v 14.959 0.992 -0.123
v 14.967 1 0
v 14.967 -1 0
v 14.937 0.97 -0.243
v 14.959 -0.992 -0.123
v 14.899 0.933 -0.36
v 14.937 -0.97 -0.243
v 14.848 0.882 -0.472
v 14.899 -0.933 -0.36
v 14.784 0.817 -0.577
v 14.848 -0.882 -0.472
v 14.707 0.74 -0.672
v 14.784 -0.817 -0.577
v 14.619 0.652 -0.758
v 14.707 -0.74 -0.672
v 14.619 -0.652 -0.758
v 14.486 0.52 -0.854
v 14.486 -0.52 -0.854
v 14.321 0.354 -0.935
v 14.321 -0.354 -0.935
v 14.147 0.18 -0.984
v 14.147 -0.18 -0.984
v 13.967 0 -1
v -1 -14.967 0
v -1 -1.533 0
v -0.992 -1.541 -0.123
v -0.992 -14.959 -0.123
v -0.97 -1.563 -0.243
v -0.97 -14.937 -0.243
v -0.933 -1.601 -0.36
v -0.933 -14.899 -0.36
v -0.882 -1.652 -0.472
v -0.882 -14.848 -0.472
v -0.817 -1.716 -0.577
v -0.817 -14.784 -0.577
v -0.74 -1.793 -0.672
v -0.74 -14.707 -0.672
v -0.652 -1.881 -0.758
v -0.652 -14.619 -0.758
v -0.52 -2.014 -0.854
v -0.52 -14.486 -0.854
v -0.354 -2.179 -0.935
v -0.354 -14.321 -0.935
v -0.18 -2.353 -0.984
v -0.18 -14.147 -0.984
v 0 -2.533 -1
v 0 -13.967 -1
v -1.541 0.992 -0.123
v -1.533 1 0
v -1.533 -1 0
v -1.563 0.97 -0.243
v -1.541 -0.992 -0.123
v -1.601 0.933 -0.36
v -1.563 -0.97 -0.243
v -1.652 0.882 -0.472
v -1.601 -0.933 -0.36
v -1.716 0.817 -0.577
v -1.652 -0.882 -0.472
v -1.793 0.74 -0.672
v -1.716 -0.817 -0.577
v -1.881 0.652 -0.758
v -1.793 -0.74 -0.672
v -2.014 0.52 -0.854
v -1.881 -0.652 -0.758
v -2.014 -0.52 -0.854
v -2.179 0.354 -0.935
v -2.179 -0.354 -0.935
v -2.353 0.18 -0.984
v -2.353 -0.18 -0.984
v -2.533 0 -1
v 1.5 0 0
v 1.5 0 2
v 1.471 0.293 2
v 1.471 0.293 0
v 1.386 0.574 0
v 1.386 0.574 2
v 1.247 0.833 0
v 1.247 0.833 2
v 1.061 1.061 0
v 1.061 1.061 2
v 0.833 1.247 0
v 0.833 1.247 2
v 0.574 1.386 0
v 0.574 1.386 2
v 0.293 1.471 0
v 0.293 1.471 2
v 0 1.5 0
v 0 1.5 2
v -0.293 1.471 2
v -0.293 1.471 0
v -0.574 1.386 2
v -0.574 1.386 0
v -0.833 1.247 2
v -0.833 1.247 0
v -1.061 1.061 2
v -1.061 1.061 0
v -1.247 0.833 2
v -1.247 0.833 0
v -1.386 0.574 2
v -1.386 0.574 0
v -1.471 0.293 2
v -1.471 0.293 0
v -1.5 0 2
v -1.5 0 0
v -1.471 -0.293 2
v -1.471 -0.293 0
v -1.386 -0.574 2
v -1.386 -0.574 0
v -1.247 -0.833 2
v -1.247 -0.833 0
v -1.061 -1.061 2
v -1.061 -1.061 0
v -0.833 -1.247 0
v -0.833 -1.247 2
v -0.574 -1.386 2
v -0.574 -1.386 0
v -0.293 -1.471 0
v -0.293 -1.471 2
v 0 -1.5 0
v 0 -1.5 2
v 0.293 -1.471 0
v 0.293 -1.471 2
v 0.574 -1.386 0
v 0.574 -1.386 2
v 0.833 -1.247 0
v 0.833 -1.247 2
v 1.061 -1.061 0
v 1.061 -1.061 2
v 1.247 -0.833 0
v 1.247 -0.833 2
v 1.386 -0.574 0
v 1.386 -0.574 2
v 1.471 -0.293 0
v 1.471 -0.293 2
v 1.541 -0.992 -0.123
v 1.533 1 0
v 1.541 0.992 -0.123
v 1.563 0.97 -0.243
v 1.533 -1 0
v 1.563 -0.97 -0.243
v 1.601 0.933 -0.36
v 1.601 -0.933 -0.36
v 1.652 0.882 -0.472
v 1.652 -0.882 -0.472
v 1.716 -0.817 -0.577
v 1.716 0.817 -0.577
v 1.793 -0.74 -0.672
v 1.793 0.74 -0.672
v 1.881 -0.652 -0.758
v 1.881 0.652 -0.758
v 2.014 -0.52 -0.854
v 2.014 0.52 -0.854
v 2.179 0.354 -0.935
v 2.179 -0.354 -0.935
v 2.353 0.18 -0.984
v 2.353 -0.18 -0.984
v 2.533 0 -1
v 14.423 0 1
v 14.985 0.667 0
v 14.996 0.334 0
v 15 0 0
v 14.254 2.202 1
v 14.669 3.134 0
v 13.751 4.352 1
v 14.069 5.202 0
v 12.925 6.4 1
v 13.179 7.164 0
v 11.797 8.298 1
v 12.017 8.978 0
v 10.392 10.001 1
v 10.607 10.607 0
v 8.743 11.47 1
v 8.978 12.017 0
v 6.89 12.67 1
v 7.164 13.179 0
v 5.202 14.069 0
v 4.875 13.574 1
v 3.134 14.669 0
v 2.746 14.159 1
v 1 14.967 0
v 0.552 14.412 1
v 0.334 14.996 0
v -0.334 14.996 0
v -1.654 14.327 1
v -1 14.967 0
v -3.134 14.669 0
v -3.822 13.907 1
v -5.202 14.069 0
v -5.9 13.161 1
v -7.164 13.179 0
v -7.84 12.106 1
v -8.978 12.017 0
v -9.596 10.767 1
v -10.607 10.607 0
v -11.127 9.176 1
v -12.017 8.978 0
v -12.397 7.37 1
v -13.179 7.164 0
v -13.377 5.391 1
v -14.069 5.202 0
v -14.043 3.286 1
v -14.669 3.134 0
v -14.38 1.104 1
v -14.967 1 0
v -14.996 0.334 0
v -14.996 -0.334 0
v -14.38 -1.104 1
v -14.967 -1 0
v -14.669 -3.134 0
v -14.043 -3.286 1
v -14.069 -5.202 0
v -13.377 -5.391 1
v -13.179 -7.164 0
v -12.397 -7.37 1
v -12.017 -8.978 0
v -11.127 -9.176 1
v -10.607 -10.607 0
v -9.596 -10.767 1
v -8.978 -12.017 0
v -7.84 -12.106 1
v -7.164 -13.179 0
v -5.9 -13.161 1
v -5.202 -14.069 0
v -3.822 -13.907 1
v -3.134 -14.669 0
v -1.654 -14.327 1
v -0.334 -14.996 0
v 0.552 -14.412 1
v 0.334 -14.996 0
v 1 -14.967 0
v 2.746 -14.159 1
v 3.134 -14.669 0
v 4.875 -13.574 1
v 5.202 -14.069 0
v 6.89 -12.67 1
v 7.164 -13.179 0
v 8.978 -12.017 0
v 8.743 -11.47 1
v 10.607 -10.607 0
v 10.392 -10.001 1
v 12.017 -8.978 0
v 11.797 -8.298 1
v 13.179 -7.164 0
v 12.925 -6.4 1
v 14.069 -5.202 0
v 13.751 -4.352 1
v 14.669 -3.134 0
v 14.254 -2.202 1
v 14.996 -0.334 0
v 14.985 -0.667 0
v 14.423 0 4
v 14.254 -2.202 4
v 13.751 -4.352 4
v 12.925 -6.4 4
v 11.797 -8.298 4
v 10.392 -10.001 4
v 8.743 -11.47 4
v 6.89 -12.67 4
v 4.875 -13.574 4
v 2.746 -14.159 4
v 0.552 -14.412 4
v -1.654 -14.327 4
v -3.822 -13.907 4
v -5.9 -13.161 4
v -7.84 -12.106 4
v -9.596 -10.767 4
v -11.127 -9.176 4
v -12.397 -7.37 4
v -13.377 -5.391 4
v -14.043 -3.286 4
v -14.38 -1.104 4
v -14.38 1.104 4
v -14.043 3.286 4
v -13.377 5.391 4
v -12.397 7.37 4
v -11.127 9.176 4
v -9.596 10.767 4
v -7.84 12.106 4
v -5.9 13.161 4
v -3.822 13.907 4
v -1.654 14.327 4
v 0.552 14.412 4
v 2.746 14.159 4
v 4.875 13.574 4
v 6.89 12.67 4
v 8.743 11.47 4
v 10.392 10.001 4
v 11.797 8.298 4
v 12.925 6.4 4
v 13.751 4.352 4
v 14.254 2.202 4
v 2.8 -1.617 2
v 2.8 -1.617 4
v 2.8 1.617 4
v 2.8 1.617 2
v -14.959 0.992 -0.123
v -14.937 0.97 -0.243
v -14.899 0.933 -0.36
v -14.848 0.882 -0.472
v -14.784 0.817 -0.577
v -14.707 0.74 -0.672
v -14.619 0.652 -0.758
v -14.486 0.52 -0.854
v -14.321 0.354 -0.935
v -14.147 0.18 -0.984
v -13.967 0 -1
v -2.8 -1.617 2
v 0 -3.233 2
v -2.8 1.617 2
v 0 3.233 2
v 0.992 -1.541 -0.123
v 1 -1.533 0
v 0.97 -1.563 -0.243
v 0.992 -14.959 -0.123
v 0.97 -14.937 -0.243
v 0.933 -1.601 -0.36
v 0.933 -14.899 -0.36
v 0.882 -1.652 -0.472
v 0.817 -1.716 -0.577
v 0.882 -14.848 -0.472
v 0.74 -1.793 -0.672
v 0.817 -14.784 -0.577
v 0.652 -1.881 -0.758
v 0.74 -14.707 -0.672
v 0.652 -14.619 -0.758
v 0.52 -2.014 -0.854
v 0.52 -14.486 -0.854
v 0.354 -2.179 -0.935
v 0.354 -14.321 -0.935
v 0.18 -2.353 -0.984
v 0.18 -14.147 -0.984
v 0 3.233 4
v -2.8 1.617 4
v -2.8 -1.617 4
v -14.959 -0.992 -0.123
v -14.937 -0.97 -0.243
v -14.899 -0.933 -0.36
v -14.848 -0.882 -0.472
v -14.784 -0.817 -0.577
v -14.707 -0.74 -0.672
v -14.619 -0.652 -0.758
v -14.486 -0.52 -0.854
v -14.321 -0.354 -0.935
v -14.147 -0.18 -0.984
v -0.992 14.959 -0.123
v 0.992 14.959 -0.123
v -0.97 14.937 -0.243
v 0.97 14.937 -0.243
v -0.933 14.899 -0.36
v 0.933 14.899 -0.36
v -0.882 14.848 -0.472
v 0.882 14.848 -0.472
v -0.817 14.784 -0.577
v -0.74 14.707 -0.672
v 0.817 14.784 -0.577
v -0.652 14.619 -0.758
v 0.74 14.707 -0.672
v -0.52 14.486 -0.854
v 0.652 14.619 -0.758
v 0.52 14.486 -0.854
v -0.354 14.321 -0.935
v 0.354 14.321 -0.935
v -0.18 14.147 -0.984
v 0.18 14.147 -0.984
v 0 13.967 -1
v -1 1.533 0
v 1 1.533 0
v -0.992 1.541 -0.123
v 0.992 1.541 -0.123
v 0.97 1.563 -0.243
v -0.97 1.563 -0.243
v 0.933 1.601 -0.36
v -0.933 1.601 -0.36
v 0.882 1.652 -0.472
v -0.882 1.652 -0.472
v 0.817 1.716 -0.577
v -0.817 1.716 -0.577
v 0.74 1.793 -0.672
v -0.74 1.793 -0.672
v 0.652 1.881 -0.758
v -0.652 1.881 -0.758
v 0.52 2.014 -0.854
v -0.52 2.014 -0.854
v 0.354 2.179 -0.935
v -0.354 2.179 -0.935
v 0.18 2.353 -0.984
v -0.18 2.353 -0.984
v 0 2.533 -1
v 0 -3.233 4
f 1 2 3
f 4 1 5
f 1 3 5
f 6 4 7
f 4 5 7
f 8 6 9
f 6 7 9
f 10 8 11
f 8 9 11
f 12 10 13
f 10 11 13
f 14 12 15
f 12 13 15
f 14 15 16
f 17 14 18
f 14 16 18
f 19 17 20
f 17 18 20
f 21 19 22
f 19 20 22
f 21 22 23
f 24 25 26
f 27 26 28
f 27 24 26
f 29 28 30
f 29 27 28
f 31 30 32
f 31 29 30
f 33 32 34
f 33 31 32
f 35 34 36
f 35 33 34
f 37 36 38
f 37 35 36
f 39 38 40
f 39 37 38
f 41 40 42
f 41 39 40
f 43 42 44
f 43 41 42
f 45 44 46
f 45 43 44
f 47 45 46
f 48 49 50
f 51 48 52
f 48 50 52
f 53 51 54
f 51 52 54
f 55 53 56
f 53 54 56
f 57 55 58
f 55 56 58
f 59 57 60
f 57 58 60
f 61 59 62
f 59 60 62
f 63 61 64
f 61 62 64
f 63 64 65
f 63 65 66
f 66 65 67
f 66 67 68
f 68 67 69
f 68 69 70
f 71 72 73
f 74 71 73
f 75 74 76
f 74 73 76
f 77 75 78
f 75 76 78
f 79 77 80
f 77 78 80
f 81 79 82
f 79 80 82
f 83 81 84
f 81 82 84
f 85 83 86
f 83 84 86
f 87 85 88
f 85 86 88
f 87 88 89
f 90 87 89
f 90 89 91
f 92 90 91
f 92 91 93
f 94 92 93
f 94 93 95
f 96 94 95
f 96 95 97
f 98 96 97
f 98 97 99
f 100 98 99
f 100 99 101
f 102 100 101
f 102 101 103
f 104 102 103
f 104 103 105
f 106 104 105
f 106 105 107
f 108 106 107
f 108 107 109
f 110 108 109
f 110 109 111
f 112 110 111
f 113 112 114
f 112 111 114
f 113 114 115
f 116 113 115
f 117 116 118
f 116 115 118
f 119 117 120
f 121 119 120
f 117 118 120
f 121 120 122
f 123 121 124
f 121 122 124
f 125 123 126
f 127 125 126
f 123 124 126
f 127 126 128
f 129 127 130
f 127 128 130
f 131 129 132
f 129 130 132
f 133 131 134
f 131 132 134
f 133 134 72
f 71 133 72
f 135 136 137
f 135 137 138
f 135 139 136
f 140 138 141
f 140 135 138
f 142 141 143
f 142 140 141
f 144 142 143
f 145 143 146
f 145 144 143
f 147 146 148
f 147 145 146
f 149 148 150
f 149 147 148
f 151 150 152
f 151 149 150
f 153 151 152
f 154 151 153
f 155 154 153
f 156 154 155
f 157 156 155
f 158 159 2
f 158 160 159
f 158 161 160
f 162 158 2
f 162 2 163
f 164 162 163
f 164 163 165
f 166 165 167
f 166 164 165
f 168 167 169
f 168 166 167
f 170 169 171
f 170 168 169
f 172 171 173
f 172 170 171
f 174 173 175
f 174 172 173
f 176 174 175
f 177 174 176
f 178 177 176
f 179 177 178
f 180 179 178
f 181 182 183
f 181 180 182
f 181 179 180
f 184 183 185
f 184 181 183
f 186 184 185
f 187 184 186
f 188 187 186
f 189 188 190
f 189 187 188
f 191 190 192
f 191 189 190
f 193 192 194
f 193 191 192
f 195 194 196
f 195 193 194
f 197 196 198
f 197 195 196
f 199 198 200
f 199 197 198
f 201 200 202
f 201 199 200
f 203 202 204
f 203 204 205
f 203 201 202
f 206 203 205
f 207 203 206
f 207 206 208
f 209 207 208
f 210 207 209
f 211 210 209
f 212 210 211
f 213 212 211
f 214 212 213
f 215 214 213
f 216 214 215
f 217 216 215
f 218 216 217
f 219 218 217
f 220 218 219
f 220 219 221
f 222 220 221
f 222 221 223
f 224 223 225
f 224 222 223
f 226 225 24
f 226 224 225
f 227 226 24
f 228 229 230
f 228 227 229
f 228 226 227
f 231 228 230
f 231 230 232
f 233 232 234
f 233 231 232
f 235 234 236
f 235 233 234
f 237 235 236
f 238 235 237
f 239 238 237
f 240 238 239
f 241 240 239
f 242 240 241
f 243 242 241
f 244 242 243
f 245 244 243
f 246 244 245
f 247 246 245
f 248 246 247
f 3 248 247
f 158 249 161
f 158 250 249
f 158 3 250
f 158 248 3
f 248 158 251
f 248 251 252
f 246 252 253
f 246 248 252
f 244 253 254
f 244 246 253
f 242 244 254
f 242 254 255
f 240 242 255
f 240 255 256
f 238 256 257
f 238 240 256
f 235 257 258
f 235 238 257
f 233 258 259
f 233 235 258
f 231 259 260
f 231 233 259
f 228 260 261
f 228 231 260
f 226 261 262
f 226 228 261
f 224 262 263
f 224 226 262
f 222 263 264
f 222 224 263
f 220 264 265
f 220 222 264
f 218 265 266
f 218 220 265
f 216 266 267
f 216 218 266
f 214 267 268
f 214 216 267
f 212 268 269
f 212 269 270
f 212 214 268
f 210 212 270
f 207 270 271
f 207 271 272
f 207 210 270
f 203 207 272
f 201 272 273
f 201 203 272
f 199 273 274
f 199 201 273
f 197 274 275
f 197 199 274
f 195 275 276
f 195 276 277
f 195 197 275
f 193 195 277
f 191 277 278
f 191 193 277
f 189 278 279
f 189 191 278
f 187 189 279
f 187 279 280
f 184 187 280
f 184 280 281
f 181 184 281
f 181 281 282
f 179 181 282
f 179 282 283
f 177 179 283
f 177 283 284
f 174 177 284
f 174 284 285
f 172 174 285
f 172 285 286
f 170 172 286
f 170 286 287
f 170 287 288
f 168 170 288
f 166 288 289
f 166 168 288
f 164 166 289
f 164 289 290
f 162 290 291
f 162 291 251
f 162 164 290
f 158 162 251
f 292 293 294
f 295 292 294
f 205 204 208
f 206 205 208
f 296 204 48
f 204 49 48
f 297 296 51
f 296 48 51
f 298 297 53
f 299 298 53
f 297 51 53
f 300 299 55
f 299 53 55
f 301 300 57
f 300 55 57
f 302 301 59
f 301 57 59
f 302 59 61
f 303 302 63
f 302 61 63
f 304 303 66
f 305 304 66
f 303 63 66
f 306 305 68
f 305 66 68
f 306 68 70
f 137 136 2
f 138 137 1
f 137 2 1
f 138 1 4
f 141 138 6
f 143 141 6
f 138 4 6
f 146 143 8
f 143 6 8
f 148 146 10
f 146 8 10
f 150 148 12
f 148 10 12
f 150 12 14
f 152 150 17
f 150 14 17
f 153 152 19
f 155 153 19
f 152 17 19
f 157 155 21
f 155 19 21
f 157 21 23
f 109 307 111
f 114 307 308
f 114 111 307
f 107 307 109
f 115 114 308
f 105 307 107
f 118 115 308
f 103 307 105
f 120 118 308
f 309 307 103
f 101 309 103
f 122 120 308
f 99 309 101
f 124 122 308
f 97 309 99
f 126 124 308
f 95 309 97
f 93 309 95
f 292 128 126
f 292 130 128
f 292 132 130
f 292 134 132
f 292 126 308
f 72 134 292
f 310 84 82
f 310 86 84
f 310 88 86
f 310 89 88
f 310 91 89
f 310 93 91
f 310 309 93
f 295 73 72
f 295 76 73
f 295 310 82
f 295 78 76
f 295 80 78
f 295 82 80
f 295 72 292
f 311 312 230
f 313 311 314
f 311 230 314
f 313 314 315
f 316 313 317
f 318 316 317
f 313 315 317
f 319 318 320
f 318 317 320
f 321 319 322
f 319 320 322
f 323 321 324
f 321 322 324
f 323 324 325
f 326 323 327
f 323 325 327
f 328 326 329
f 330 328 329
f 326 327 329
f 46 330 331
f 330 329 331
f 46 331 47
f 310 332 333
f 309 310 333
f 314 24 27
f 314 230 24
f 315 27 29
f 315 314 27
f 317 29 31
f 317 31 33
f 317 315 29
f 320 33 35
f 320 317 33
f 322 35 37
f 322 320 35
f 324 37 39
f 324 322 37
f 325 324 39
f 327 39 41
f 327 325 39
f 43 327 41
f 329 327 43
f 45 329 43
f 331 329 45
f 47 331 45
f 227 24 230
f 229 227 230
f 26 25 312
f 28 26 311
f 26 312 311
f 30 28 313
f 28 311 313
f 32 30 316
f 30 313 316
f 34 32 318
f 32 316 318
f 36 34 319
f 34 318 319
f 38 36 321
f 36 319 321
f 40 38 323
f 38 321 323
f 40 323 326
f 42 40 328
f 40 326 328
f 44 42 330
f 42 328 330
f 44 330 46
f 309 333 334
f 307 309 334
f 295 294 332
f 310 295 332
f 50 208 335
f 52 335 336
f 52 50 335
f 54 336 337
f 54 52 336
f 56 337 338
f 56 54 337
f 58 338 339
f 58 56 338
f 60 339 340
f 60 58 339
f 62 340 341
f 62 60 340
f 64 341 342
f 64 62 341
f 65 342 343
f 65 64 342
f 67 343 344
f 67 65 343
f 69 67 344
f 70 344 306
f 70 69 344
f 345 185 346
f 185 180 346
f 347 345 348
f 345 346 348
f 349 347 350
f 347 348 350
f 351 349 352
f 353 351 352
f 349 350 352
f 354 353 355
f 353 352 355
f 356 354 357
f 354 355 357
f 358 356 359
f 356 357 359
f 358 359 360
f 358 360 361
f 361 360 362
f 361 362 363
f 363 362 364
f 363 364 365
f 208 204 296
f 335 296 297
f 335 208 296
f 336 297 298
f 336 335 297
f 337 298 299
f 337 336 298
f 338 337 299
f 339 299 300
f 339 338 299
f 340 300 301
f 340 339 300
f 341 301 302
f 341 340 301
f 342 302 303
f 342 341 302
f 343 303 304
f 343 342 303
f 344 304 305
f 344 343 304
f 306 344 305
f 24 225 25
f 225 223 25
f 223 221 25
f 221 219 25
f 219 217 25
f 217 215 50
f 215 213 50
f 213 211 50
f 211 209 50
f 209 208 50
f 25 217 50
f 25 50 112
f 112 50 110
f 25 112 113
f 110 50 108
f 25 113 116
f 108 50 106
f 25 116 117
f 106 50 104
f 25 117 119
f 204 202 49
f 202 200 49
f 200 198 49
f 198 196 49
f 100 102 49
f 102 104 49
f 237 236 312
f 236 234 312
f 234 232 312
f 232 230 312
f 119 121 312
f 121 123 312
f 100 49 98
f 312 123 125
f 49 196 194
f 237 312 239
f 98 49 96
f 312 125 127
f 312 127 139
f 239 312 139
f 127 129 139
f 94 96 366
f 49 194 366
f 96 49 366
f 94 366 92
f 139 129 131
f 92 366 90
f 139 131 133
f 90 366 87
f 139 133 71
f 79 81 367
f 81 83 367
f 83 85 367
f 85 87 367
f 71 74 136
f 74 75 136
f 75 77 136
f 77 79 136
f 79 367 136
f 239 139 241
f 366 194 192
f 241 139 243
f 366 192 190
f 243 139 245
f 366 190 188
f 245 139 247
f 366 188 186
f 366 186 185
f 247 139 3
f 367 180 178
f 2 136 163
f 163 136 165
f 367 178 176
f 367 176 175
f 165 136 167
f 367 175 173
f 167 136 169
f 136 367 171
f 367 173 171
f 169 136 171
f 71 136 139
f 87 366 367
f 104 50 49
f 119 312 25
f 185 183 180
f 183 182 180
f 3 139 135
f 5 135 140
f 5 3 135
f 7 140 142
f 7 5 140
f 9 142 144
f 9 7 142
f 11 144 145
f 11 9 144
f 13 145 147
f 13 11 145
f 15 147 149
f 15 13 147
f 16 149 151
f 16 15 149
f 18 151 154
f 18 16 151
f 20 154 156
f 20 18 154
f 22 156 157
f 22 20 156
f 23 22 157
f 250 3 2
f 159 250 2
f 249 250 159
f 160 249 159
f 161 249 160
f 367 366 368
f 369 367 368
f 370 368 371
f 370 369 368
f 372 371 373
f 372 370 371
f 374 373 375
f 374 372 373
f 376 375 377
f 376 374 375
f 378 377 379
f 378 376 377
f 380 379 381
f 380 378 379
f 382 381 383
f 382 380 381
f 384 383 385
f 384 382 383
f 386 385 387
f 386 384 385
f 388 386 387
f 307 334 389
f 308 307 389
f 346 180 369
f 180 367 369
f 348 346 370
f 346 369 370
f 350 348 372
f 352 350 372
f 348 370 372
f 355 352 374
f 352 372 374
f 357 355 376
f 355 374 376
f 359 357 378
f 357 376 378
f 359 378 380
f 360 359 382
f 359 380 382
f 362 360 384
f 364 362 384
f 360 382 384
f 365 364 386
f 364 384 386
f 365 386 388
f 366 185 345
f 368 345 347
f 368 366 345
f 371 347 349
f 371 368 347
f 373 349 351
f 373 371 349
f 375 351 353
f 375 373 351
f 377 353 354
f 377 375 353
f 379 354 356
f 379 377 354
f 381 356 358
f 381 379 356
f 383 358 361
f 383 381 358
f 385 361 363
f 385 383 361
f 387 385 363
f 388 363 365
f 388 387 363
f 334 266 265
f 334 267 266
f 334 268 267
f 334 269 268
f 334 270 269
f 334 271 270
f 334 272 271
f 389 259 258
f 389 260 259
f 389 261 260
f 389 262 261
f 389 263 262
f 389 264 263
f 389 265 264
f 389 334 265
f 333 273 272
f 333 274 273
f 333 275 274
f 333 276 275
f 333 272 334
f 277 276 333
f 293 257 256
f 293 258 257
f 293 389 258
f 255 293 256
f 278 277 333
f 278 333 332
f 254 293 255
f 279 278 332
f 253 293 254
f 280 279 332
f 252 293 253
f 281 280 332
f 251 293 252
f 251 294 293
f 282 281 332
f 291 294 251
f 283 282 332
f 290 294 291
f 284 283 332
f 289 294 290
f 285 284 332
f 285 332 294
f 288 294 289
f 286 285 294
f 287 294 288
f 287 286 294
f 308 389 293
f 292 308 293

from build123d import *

# Parameters (mm, degrees)
F0_R     = 15
F1_DEPTH = 1
F1_TAPER = 30
F2_DEPTH = 3
F4_DEPTH = 2
F5_R     = 1.5
F6_DEPTH = 2.001
F7_W     = 13.4332590942
F7_H     = 2
F7_W_2   = 2
F7_H_2   = 13.4332590942
F8_DEPTH = 1
F9_R     = 0.99999


# Not quite as in the source:
# - a fillet or chamfer is up to 0.001 mm smaller than in the source, because OpenCascade refuses the exact size


with BuildPart() as f1:
    # F0 (on Top) → F1 (new body)
    with BuildSketch(Plane.XY):
        Circle(F0_R)
    extrude(amount=F1_DEPTH, taper=F1_TAPER)

    # F2 (add): a face of the model
    f2_faces = [f1.faces().sort_by_distance(p)[0] for p in [
        (0, 0, 1),
    ]]
    extrude(f2_faces, amount=F2_DEPTH)

    # F3 (on face) → F4 (cut)
    with BuildSketch(Plane.XY.offset(4)):
        Polygon((2.8, -1.6165807537), (2.8, 1.6165807537), (0, 3.2331615075), (-2.8, 1.6165807537), (-2.8, -1.6165807537), (0, -3.2331615075), align=None)
    extrude(amount=-F4_DEPTH, mode=Mode.SUBTRACT)

    # F5 (on face) → F6 (cut, through all)
    with BuildSketch(Plane.XY.offset(2)):
        Circle(F5_R)
    extrude(amount=-F6_DEPTH, mode=Mode.SUBTRACT)

    # F7 (on face) → F8 (join)
    with BuildSketch(Plane(origin=(0, 0, 0), x_dir=(1, 0, 0), z_dir=(0, 0, -1))):
        with Locations((-8.25, 0)):
            Rectangle(F7_W, F7_H)
        with Locations((0, 8.25)):
            Rectangle(F7_W_2, F7_H_2)
        with Locations((8.25, 0)):
            Rectangle(F7_W, F7_H)
        with Locations((0, -8.25)):
            Rectangle(F7_W_2, F7_H_2)
    extrude(amount=F8_DEPTH)

    # F9 (radius 1 in the source; OpenCascade refuses exactly that, so slightly less here)
    f9_edges = [f1.edges().sort_by_distance(p)[0] for p in [
        (-1, 8.25, -1),
        (1, 8.25, -1),
        (8.25, 1, -1),
        (14.96663, 0, -1),
        (8.25, -1, -1),
        (1.53337, 0, -1),
        (-8.25, 1, -1),
        (-8.25, -1, -1),
        (1, -8.25, -1),
        (-1, -8.25, -1),
        (0, 14.96663, -1),
        (0, 1.53337, -1),
        (0, -1.53337, -1),
        (-1.53337, 0, -1),
        (-14.96663, 0, -1),
        (0, -14.96663, -1),
    ]]
    fillet(f9_edges, radius=F9_R)


solid = f1.part
